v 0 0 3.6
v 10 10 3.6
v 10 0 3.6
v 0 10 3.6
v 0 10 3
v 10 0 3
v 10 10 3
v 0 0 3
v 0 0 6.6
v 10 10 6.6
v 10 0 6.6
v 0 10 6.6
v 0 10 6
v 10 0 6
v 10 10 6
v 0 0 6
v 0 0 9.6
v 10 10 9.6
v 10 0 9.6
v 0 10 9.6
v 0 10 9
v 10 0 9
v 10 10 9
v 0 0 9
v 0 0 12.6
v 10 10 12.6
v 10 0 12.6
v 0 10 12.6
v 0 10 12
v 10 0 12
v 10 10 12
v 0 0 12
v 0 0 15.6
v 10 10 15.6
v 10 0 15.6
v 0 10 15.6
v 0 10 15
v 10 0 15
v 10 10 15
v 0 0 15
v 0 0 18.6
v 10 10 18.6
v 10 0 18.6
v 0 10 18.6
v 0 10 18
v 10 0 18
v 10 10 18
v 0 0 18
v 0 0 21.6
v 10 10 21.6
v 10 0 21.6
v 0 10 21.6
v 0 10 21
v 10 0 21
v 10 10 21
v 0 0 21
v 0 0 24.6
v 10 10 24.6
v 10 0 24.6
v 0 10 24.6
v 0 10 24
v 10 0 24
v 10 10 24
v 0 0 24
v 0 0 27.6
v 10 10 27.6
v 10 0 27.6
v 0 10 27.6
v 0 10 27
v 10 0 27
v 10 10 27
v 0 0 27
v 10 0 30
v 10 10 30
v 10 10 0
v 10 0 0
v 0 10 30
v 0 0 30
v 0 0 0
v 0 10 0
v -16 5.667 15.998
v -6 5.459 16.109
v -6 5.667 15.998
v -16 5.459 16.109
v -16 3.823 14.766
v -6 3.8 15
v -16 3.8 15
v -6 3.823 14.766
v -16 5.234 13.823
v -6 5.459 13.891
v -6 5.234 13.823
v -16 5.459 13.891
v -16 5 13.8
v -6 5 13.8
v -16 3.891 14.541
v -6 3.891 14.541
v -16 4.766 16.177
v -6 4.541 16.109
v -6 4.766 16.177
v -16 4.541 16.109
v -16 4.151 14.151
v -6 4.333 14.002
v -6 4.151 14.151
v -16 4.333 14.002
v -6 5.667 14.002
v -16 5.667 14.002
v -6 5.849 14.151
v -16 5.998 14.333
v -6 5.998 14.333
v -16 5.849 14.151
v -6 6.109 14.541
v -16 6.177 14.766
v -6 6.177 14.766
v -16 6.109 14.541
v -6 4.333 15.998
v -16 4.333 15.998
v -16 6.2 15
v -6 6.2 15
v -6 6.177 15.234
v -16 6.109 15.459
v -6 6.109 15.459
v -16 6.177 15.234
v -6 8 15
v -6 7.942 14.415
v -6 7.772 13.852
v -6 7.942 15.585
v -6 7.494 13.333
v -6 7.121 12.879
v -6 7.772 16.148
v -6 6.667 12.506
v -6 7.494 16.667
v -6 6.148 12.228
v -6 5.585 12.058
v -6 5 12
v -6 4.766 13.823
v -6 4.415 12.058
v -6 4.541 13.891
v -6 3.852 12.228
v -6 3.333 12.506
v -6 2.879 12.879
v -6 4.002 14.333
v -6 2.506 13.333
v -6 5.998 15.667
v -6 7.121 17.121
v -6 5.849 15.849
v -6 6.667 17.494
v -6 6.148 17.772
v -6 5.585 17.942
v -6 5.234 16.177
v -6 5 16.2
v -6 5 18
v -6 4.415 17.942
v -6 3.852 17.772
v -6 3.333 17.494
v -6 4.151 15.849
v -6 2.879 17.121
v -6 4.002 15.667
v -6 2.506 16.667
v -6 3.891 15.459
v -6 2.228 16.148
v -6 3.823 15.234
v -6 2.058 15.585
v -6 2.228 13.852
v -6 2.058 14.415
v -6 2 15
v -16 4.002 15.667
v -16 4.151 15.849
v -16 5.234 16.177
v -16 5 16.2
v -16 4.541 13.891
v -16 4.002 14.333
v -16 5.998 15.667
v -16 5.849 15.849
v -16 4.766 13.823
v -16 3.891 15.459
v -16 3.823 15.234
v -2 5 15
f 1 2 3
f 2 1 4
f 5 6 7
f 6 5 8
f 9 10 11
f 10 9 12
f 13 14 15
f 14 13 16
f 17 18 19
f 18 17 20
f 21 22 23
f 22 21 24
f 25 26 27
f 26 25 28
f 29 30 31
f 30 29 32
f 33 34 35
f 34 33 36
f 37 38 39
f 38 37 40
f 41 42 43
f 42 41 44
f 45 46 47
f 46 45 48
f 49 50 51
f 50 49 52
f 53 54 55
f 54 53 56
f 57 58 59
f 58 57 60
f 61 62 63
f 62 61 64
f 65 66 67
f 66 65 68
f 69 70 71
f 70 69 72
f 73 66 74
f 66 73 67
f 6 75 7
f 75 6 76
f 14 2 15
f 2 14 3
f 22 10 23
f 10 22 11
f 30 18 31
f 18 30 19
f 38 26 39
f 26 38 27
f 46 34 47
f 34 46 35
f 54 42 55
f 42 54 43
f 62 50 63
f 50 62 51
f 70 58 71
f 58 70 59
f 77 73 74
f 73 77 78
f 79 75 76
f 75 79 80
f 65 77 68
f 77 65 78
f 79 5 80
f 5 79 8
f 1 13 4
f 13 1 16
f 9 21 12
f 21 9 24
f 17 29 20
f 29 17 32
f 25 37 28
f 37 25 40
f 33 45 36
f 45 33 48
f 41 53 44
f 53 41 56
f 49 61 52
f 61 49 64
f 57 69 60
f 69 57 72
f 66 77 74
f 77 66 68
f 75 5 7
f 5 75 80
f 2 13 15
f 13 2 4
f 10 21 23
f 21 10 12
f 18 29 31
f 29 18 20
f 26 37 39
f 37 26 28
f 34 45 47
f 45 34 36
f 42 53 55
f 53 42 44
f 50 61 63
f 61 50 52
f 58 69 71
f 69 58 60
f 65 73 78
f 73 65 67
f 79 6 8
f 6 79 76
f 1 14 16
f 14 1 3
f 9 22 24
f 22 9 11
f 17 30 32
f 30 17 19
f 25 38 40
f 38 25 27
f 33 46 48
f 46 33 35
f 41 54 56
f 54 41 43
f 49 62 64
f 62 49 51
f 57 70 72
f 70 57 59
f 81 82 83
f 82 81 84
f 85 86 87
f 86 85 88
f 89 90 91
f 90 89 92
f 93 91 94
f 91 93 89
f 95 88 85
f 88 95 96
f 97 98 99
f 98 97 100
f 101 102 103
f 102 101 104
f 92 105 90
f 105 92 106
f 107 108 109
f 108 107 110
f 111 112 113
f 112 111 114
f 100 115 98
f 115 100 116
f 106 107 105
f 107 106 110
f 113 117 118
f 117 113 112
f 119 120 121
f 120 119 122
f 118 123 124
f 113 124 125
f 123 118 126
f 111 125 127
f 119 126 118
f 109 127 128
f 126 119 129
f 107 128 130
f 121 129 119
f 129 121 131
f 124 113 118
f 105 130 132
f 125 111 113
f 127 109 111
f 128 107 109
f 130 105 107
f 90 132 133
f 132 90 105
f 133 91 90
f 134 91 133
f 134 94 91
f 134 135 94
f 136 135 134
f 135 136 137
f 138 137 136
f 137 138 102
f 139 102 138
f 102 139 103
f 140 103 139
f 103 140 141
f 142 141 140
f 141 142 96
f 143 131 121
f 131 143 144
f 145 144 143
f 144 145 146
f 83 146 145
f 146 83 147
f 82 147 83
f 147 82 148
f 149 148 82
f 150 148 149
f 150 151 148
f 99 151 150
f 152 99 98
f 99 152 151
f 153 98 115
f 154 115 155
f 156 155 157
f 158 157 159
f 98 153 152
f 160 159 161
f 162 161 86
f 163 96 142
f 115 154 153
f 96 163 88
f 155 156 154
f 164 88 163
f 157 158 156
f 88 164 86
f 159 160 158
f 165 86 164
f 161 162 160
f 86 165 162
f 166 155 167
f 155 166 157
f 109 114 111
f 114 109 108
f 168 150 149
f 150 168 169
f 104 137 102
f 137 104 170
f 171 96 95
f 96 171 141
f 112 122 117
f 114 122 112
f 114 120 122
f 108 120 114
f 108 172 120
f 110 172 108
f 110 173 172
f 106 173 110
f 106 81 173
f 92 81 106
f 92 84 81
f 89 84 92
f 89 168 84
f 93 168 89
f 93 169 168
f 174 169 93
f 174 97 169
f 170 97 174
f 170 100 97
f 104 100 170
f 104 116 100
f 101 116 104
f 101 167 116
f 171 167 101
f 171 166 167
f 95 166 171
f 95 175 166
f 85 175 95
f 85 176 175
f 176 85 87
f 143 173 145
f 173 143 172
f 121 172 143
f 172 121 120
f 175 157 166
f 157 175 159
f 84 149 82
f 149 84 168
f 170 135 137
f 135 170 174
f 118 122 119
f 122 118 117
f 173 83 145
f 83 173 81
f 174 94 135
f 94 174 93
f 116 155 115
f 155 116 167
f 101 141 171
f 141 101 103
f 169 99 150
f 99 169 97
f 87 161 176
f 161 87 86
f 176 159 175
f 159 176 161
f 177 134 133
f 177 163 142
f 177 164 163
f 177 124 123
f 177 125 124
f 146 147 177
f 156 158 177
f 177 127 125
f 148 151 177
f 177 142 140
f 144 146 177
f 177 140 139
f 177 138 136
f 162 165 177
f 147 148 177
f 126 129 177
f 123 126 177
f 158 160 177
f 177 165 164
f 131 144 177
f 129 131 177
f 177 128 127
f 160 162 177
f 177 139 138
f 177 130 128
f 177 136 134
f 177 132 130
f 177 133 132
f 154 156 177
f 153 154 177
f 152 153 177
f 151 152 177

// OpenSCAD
// Load direction vs. layer stacking: a bracket with horizontal grooves
// representing print layers stacked along Z, and an arrow showing the
// CORRECT load direction -- horizontal, across the layer stack, not a
// vertical pull along it.
$fn = 32;
sx = 10; sy = 10; sz = 30; groove_spacing = 3;

difference() {
    cube([sx, sy, sz]);
    for (z = [groove_spacing : groove_spacing : sz - groove_spacing])
        translate([-1, -1, z]) cube([sx + 2, sy + 2, 0.6]);
}

// load arrow: shaft + cone head, pointing horizontally into the block's
// side at mid-height -- load acts across the layer planes, not along them
translate([-16, sy / 2, sz / 2])
rotate([0, 90, 0])
union() {
    cylinder(h = 10, r = 1.2);
    translate([0, 0, 10]) cylinder(h = 4, r1 = 3, r2 = 0);
}
